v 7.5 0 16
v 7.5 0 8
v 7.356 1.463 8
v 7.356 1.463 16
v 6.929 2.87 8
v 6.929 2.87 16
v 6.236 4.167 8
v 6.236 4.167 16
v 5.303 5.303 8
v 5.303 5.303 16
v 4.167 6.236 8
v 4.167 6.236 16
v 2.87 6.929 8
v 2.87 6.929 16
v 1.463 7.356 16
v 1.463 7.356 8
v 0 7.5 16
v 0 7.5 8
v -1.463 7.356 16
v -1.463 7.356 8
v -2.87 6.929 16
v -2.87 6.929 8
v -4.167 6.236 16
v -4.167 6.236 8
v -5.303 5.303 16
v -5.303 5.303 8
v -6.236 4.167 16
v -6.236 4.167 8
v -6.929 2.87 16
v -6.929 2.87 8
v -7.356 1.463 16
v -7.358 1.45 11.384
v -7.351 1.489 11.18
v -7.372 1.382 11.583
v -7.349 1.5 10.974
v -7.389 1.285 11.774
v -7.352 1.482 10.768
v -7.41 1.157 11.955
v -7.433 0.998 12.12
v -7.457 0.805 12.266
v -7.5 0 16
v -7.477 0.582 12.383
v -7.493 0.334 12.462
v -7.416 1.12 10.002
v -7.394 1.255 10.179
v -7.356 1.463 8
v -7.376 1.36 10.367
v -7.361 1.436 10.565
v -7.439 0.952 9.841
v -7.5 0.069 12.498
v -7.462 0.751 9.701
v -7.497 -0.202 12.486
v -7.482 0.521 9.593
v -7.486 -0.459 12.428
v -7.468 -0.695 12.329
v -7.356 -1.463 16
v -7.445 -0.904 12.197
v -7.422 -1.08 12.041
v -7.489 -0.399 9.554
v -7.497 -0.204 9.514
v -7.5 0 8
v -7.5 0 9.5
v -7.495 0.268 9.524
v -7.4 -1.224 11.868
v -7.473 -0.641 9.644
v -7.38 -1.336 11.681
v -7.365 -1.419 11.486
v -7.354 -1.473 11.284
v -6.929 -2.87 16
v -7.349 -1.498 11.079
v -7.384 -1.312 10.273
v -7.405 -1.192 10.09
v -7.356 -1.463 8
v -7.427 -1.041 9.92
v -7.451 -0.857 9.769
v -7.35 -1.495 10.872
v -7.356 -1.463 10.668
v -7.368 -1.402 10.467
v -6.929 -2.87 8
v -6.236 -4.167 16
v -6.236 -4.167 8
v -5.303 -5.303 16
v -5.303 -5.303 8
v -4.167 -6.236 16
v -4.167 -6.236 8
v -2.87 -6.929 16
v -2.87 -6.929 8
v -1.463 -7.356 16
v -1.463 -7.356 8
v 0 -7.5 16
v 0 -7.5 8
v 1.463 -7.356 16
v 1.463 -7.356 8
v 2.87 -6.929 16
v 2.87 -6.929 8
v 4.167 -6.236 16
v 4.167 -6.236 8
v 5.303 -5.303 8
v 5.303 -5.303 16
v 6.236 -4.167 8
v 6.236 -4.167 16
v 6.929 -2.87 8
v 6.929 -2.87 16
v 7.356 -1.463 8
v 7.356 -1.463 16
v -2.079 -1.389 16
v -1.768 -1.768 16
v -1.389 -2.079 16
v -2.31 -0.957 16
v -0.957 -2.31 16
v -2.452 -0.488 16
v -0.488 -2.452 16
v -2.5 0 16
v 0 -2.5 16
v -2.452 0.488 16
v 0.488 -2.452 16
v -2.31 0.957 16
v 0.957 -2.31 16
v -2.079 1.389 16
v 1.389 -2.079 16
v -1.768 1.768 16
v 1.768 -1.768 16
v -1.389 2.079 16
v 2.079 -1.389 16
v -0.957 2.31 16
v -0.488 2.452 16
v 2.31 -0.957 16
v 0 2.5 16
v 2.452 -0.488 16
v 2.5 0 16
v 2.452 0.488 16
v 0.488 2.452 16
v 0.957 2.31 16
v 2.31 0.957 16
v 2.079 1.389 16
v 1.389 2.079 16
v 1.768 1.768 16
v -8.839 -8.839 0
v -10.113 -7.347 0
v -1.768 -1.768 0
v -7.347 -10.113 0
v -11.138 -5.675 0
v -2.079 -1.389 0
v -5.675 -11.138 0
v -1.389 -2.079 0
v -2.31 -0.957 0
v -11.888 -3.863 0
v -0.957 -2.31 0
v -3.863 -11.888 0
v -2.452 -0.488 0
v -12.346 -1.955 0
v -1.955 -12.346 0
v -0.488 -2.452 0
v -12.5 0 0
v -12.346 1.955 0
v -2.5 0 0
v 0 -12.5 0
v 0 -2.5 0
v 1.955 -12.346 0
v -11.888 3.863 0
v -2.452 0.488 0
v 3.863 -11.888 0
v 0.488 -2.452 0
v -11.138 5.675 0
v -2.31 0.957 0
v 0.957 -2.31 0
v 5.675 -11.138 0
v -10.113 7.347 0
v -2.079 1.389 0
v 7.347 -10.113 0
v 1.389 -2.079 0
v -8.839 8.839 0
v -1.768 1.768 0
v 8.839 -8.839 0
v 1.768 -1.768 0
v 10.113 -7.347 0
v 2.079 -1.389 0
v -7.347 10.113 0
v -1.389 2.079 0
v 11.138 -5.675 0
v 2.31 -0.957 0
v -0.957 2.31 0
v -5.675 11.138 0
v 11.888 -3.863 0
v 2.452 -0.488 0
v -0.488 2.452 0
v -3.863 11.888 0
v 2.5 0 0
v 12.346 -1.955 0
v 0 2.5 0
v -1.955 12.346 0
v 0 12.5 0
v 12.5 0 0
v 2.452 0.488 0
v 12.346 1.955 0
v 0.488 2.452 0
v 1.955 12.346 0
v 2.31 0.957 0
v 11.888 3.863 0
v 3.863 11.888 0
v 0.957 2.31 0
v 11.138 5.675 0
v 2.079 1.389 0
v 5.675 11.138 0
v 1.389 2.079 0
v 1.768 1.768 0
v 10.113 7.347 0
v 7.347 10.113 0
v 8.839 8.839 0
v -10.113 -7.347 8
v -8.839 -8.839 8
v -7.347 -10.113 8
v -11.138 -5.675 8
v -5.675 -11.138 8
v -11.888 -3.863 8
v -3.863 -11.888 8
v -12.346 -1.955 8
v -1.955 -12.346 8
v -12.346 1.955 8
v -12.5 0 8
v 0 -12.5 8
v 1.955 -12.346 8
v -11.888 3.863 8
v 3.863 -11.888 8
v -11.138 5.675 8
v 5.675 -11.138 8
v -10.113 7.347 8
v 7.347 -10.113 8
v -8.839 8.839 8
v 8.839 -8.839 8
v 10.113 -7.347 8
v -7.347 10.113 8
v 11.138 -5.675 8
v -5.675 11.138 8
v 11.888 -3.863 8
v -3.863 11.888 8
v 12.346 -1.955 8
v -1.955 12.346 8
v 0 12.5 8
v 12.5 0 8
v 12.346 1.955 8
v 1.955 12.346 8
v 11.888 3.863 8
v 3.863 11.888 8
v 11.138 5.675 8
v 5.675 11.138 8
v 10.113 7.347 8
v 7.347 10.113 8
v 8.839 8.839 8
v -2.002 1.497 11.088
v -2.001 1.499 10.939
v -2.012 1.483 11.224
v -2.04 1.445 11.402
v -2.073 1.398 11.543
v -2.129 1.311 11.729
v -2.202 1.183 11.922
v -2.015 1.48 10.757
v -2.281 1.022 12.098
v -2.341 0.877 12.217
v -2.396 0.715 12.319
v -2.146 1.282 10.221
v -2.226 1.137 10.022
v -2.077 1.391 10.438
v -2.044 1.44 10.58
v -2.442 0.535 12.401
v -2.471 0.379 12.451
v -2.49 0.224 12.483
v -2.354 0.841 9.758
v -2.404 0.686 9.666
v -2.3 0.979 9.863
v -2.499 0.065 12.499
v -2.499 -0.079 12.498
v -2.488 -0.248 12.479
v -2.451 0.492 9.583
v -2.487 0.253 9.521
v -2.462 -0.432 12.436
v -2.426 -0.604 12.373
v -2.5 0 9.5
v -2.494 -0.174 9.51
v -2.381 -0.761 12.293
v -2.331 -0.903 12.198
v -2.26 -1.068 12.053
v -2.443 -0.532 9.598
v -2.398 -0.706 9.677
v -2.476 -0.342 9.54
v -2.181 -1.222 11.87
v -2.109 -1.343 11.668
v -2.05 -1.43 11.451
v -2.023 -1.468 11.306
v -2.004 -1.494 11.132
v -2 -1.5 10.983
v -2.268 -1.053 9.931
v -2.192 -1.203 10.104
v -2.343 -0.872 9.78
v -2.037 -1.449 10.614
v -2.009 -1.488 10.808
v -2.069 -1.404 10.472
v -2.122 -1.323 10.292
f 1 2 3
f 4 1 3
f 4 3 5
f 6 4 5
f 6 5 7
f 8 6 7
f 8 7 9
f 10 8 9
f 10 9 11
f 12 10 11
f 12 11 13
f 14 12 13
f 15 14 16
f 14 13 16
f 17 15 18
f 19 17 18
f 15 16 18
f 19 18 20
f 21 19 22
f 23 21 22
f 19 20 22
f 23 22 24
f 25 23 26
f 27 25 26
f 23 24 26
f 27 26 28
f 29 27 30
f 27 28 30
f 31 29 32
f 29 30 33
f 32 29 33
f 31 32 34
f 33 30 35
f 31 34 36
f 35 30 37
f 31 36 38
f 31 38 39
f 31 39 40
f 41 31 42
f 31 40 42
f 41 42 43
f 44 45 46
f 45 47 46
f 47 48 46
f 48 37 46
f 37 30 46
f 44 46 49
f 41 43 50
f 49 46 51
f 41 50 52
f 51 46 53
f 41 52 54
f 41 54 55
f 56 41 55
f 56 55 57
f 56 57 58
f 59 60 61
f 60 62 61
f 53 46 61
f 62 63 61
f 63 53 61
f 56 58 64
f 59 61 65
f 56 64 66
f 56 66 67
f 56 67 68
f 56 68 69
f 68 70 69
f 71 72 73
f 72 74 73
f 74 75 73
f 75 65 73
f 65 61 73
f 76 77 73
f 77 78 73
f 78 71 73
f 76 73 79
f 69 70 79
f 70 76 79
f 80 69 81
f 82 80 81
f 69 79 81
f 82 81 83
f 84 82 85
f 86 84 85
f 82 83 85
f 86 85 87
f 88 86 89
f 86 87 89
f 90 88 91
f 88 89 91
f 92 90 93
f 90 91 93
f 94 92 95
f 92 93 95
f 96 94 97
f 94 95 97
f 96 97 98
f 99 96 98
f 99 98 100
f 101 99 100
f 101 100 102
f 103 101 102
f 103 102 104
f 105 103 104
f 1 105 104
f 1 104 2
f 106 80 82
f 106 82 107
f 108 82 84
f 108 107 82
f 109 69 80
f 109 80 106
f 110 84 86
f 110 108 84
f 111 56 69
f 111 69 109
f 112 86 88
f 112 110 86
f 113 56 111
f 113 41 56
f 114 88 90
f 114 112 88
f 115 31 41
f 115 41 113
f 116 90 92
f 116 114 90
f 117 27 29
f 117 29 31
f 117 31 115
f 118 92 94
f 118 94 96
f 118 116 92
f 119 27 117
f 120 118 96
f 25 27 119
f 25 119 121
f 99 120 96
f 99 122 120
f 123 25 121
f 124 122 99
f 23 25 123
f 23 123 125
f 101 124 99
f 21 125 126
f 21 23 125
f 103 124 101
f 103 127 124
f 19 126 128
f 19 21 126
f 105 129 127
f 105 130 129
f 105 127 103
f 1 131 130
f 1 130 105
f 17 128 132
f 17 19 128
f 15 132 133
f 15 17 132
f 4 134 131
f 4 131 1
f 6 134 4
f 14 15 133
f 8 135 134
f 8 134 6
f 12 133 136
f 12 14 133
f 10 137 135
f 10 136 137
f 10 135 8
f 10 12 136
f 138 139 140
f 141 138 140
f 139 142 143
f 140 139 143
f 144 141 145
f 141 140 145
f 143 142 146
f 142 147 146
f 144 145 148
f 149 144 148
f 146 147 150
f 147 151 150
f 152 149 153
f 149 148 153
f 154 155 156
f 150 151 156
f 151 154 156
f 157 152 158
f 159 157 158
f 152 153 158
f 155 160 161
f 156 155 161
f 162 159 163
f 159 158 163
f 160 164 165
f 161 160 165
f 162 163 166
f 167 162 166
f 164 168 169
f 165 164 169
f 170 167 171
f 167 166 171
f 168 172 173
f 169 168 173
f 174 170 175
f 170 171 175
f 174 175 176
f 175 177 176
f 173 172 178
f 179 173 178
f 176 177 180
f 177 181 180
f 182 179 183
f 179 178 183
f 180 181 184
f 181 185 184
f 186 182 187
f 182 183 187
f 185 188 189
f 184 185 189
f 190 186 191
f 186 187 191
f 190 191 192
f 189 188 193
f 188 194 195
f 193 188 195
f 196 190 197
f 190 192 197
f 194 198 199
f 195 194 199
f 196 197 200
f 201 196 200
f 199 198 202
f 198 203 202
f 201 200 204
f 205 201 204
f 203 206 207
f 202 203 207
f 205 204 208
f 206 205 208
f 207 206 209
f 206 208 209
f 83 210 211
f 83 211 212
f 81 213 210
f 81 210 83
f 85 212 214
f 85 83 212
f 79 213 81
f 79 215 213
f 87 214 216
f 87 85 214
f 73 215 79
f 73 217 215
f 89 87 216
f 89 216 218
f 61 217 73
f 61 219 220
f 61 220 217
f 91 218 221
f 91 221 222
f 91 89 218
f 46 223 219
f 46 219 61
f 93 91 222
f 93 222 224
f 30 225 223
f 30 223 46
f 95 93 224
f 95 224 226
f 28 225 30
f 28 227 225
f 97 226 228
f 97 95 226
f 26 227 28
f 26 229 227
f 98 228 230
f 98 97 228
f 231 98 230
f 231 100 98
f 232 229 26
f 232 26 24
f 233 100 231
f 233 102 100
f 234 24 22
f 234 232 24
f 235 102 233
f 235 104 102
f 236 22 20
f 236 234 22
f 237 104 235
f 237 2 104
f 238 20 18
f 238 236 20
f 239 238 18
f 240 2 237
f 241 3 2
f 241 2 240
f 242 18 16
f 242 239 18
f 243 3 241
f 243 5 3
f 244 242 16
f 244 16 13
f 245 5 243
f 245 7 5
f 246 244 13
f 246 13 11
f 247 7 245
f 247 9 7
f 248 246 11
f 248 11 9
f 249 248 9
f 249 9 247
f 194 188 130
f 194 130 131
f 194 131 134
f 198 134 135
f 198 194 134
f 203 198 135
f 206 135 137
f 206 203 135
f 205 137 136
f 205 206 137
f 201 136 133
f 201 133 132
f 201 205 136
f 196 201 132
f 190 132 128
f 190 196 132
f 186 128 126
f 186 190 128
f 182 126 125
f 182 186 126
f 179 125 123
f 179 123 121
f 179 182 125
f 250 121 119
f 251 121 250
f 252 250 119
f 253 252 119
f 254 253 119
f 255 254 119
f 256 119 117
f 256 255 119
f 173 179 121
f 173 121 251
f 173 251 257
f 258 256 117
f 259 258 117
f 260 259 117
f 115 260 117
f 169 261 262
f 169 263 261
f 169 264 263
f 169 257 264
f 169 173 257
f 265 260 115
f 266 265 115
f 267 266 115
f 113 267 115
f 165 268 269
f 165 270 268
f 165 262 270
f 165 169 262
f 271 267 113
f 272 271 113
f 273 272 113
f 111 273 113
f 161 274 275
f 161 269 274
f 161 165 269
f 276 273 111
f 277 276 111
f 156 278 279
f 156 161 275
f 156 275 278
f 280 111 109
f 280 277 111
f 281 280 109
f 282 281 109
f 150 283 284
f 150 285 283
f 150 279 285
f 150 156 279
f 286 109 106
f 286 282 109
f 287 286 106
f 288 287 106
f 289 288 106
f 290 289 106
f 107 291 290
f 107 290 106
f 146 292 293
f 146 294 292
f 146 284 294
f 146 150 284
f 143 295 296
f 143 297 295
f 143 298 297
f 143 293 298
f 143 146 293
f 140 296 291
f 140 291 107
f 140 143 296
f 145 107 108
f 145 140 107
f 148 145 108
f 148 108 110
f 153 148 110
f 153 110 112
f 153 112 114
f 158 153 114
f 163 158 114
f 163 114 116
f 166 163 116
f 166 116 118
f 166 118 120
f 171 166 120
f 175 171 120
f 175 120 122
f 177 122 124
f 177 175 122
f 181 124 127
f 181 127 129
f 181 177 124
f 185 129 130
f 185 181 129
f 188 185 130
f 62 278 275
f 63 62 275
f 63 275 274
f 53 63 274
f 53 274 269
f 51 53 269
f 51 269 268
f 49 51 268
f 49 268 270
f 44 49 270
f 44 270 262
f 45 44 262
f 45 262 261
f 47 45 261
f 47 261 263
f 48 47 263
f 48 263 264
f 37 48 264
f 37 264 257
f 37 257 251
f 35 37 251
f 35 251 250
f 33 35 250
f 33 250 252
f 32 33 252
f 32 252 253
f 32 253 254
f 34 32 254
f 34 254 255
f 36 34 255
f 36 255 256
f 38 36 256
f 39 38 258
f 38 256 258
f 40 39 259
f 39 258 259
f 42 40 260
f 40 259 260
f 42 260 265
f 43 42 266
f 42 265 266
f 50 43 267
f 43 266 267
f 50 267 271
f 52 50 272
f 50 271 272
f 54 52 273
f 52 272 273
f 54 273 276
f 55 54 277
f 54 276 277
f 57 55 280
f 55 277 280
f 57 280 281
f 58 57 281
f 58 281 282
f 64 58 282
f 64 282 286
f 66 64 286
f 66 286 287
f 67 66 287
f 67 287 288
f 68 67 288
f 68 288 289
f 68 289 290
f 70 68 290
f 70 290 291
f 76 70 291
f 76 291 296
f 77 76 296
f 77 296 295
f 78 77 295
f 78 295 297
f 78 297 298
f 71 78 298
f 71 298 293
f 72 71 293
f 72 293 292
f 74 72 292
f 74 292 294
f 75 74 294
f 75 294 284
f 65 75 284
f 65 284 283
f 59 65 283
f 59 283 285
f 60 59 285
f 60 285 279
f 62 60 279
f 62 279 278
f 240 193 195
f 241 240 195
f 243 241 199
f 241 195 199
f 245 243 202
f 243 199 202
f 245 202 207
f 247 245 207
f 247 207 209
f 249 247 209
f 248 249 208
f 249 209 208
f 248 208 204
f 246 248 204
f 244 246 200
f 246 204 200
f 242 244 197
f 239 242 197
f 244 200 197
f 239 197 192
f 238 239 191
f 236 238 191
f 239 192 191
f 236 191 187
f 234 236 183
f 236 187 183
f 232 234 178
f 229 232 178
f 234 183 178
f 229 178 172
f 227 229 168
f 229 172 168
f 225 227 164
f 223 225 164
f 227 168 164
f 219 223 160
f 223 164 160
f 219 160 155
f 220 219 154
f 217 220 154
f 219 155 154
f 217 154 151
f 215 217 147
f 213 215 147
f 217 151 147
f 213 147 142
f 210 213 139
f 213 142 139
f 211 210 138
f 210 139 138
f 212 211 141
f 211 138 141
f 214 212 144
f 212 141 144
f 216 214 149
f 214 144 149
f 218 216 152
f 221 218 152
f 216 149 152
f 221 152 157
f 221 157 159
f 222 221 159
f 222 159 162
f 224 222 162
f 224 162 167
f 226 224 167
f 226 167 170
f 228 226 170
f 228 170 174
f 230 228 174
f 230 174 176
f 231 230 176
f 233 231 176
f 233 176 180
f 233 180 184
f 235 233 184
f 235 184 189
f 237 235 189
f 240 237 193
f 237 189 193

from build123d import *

# Parameters (mm, degrees)
SKETCH_1_R          = 12.5
SKETCH_1_R_2        = 2.5
EXTRUDE_1_DEPTH     = 8
SKETCH_2_R          = 7.5
SKETCH_2_R_2        = 2.5
EXTRUDE_2_DEPTH     = 8
SKETCH_4_R          = 1.5
CUT_EXTRUDE_1_DEPTH = 10


with BuildPart() as part:
    # Эскиз1 → Бобышка-Вытянуть1 (new body)
    with BuildSketch(Plane.XY):
        Circle(SKETCH_1_R)
        Circle(SKETCH_1_R_2, mode=Mode.SUBTRACT)
    extrude(amount=EXTRUDE_1_DEPTH)

    # Эскиз2 → Бобышка-Вытянуть2 (add)
    with BuildSketch(Plane.XY.offset(8)):
        Circle(SKETCH_2_R)
        Circle(SKETCH_2_R_2, mode=Mode.SUBTRACT)
    extrude(amount=EXTRUDE_2_DEPTH)

    # Эскиз4 → Вырез-Вытянуть1 (cut)
    with BuildSketch(Plane(origin=(0, 0, 0), x_dir=(0, 0, -1), z_dir=(1, 0, 0))):
        with Locations((-11, 0)):
            Circle(SKETCH_4_R)
    extrude(amount=-CUT_EXTRUDE_1_DEPTH, mode=Mode.SUBTRACT)


solid = part.part
